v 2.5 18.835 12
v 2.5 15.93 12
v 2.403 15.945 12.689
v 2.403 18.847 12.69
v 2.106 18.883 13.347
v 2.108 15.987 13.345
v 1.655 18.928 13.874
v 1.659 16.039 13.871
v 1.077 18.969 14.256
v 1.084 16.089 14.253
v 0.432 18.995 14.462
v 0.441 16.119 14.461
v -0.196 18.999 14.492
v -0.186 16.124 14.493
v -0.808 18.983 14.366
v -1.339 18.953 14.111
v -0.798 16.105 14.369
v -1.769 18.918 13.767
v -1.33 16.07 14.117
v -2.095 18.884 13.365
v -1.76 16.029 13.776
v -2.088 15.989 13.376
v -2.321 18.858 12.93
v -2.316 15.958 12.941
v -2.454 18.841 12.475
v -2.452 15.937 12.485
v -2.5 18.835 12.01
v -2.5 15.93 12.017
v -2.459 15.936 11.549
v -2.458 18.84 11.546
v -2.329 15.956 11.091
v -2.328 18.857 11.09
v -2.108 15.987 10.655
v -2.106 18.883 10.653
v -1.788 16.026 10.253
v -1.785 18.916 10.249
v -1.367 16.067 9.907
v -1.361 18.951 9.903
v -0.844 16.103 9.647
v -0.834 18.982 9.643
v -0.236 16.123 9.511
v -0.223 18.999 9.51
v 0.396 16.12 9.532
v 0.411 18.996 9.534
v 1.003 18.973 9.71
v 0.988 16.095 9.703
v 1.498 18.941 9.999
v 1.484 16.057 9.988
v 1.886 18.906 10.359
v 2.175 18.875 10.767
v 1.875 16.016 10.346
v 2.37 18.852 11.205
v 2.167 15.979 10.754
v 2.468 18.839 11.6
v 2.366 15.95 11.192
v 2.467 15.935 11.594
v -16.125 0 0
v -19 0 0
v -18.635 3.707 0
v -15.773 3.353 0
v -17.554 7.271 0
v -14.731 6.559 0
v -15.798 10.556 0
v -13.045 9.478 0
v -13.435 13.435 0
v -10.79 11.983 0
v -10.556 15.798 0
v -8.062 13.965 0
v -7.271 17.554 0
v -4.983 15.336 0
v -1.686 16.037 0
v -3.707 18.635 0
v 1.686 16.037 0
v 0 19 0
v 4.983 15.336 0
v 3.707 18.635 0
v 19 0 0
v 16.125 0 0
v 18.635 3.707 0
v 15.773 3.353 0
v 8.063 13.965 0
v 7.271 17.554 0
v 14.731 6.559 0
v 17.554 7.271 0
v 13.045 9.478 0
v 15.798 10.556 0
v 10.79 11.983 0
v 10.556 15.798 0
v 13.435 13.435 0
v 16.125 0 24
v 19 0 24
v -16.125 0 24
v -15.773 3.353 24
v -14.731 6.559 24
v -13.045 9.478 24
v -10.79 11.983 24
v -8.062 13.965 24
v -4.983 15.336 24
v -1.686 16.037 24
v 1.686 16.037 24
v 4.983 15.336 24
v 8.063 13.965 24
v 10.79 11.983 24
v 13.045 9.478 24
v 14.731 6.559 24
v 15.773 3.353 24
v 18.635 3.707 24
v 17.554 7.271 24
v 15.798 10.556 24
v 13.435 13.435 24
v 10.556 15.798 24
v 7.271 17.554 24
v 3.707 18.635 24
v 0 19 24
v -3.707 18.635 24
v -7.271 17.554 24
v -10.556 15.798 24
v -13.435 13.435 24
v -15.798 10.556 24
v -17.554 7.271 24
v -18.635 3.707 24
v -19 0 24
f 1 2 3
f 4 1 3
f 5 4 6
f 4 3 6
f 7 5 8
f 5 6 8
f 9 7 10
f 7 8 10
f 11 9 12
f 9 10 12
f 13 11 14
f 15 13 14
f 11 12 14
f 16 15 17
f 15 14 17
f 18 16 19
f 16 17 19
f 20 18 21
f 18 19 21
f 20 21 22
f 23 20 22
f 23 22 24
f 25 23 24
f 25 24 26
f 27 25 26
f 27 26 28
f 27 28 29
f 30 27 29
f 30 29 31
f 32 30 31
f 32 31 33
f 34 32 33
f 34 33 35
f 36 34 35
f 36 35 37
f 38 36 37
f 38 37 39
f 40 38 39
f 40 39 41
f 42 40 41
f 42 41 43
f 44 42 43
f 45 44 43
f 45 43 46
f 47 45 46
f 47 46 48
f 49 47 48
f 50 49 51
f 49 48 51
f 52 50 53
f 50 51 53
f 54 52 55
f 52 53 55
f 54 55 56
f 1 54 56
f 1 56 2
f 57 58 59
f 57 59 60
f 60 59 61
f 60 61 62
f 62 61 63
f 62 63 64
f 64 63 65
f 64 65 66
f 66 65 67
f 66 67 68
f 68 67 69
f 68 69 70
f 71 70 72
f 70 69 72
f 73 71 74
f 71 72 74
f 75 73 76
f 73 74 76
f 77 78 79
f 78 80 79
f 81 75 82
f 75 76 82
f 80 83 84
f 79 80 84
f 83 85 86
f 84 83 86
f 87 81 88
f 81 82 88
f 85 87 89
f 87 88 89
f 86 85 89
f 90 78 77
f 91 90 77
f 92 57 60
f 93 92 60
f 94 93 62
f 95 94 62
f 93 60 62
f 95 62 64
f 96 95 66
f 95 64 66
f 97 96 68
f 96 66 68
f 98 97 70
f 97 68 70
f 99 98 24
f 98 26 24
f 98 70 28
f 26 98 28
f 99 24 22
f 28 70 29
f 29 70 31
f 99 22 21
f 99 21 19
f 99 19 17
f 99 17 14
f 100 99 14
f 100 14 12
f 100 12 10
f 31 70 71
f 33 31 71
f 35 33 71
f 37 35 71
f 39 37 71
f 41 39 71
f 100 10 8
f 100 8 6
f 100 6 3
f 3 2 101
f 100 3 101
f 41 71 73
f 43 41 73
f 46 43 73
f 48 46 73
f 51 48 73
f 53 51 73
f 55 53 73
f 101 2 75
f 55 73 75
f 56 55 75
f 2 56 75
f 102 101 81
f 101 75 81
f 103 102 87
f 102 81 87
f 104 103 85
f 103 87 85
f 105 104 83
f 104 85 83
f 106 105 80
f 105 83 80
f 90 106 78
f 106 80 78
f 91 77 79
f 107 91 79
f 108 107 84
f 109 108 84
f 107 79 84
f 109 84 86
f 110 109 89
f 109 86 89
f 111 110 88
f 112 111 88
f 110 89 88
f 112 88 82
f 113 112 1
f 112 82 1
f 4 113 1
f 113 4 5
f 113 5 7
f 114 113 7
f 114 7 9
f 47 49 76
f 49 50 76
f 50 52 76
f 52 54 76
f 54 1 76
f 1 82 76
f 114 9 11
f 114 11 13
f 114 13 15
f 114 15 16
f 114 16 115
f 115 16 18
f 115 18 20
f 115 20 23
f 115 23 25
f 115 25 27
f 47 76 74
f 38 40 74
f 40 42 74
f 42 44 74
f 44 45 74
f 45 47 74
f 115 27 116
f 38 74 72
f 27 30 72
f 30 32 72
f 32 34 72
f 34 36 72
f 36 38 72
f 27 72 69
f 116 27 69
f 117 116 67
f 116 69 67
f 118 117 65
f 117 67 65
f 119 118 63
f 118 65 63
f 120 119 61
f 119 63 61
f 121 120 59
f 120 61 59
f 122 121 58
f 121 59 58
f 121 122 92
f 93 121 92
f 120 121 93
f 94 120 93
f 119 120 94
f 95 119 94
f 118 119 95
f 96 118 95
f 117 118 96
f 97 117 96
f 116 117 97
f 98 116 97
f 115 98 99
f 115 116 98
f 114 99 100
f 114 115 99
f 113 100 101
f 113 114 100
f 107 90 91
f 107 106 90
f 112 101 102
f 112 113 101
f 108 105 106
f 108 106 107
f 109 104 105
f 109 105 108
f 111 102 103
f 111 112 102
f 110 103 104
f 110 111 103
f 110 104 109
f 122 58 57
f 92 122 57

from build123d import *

# Parameters (mm, degrees)
F1_DEPTH = 24
F2_R     = 2.5
F3_DEPTH = 25


with BuildPart() as f1:
    # F0 (on Top) → F1 (new body)
    with BuildSketch(Plane.XY):
        with BuildLine():
            Line((16.125, 0), (19, 0))
            ThreePointArc((19, 0), (0, 19), (-19, 0))
            Line((-19, 0), (-16.125, 0))
            ThreePointArc((-16.125, 0), (0, 16.125), (16.125, 0))
        make_face()
    extrude(amount=F1_DEPTH)

    # F2 (on Front) → F3 (cut)
    with BuildSketch(Plane.XZ):
        with Locations((0, 12)):
            Circle(F2_R)
    extrude(amount=-F3_DEPTH, mode=Mode.SUBTRACT)


solid = f1.part
